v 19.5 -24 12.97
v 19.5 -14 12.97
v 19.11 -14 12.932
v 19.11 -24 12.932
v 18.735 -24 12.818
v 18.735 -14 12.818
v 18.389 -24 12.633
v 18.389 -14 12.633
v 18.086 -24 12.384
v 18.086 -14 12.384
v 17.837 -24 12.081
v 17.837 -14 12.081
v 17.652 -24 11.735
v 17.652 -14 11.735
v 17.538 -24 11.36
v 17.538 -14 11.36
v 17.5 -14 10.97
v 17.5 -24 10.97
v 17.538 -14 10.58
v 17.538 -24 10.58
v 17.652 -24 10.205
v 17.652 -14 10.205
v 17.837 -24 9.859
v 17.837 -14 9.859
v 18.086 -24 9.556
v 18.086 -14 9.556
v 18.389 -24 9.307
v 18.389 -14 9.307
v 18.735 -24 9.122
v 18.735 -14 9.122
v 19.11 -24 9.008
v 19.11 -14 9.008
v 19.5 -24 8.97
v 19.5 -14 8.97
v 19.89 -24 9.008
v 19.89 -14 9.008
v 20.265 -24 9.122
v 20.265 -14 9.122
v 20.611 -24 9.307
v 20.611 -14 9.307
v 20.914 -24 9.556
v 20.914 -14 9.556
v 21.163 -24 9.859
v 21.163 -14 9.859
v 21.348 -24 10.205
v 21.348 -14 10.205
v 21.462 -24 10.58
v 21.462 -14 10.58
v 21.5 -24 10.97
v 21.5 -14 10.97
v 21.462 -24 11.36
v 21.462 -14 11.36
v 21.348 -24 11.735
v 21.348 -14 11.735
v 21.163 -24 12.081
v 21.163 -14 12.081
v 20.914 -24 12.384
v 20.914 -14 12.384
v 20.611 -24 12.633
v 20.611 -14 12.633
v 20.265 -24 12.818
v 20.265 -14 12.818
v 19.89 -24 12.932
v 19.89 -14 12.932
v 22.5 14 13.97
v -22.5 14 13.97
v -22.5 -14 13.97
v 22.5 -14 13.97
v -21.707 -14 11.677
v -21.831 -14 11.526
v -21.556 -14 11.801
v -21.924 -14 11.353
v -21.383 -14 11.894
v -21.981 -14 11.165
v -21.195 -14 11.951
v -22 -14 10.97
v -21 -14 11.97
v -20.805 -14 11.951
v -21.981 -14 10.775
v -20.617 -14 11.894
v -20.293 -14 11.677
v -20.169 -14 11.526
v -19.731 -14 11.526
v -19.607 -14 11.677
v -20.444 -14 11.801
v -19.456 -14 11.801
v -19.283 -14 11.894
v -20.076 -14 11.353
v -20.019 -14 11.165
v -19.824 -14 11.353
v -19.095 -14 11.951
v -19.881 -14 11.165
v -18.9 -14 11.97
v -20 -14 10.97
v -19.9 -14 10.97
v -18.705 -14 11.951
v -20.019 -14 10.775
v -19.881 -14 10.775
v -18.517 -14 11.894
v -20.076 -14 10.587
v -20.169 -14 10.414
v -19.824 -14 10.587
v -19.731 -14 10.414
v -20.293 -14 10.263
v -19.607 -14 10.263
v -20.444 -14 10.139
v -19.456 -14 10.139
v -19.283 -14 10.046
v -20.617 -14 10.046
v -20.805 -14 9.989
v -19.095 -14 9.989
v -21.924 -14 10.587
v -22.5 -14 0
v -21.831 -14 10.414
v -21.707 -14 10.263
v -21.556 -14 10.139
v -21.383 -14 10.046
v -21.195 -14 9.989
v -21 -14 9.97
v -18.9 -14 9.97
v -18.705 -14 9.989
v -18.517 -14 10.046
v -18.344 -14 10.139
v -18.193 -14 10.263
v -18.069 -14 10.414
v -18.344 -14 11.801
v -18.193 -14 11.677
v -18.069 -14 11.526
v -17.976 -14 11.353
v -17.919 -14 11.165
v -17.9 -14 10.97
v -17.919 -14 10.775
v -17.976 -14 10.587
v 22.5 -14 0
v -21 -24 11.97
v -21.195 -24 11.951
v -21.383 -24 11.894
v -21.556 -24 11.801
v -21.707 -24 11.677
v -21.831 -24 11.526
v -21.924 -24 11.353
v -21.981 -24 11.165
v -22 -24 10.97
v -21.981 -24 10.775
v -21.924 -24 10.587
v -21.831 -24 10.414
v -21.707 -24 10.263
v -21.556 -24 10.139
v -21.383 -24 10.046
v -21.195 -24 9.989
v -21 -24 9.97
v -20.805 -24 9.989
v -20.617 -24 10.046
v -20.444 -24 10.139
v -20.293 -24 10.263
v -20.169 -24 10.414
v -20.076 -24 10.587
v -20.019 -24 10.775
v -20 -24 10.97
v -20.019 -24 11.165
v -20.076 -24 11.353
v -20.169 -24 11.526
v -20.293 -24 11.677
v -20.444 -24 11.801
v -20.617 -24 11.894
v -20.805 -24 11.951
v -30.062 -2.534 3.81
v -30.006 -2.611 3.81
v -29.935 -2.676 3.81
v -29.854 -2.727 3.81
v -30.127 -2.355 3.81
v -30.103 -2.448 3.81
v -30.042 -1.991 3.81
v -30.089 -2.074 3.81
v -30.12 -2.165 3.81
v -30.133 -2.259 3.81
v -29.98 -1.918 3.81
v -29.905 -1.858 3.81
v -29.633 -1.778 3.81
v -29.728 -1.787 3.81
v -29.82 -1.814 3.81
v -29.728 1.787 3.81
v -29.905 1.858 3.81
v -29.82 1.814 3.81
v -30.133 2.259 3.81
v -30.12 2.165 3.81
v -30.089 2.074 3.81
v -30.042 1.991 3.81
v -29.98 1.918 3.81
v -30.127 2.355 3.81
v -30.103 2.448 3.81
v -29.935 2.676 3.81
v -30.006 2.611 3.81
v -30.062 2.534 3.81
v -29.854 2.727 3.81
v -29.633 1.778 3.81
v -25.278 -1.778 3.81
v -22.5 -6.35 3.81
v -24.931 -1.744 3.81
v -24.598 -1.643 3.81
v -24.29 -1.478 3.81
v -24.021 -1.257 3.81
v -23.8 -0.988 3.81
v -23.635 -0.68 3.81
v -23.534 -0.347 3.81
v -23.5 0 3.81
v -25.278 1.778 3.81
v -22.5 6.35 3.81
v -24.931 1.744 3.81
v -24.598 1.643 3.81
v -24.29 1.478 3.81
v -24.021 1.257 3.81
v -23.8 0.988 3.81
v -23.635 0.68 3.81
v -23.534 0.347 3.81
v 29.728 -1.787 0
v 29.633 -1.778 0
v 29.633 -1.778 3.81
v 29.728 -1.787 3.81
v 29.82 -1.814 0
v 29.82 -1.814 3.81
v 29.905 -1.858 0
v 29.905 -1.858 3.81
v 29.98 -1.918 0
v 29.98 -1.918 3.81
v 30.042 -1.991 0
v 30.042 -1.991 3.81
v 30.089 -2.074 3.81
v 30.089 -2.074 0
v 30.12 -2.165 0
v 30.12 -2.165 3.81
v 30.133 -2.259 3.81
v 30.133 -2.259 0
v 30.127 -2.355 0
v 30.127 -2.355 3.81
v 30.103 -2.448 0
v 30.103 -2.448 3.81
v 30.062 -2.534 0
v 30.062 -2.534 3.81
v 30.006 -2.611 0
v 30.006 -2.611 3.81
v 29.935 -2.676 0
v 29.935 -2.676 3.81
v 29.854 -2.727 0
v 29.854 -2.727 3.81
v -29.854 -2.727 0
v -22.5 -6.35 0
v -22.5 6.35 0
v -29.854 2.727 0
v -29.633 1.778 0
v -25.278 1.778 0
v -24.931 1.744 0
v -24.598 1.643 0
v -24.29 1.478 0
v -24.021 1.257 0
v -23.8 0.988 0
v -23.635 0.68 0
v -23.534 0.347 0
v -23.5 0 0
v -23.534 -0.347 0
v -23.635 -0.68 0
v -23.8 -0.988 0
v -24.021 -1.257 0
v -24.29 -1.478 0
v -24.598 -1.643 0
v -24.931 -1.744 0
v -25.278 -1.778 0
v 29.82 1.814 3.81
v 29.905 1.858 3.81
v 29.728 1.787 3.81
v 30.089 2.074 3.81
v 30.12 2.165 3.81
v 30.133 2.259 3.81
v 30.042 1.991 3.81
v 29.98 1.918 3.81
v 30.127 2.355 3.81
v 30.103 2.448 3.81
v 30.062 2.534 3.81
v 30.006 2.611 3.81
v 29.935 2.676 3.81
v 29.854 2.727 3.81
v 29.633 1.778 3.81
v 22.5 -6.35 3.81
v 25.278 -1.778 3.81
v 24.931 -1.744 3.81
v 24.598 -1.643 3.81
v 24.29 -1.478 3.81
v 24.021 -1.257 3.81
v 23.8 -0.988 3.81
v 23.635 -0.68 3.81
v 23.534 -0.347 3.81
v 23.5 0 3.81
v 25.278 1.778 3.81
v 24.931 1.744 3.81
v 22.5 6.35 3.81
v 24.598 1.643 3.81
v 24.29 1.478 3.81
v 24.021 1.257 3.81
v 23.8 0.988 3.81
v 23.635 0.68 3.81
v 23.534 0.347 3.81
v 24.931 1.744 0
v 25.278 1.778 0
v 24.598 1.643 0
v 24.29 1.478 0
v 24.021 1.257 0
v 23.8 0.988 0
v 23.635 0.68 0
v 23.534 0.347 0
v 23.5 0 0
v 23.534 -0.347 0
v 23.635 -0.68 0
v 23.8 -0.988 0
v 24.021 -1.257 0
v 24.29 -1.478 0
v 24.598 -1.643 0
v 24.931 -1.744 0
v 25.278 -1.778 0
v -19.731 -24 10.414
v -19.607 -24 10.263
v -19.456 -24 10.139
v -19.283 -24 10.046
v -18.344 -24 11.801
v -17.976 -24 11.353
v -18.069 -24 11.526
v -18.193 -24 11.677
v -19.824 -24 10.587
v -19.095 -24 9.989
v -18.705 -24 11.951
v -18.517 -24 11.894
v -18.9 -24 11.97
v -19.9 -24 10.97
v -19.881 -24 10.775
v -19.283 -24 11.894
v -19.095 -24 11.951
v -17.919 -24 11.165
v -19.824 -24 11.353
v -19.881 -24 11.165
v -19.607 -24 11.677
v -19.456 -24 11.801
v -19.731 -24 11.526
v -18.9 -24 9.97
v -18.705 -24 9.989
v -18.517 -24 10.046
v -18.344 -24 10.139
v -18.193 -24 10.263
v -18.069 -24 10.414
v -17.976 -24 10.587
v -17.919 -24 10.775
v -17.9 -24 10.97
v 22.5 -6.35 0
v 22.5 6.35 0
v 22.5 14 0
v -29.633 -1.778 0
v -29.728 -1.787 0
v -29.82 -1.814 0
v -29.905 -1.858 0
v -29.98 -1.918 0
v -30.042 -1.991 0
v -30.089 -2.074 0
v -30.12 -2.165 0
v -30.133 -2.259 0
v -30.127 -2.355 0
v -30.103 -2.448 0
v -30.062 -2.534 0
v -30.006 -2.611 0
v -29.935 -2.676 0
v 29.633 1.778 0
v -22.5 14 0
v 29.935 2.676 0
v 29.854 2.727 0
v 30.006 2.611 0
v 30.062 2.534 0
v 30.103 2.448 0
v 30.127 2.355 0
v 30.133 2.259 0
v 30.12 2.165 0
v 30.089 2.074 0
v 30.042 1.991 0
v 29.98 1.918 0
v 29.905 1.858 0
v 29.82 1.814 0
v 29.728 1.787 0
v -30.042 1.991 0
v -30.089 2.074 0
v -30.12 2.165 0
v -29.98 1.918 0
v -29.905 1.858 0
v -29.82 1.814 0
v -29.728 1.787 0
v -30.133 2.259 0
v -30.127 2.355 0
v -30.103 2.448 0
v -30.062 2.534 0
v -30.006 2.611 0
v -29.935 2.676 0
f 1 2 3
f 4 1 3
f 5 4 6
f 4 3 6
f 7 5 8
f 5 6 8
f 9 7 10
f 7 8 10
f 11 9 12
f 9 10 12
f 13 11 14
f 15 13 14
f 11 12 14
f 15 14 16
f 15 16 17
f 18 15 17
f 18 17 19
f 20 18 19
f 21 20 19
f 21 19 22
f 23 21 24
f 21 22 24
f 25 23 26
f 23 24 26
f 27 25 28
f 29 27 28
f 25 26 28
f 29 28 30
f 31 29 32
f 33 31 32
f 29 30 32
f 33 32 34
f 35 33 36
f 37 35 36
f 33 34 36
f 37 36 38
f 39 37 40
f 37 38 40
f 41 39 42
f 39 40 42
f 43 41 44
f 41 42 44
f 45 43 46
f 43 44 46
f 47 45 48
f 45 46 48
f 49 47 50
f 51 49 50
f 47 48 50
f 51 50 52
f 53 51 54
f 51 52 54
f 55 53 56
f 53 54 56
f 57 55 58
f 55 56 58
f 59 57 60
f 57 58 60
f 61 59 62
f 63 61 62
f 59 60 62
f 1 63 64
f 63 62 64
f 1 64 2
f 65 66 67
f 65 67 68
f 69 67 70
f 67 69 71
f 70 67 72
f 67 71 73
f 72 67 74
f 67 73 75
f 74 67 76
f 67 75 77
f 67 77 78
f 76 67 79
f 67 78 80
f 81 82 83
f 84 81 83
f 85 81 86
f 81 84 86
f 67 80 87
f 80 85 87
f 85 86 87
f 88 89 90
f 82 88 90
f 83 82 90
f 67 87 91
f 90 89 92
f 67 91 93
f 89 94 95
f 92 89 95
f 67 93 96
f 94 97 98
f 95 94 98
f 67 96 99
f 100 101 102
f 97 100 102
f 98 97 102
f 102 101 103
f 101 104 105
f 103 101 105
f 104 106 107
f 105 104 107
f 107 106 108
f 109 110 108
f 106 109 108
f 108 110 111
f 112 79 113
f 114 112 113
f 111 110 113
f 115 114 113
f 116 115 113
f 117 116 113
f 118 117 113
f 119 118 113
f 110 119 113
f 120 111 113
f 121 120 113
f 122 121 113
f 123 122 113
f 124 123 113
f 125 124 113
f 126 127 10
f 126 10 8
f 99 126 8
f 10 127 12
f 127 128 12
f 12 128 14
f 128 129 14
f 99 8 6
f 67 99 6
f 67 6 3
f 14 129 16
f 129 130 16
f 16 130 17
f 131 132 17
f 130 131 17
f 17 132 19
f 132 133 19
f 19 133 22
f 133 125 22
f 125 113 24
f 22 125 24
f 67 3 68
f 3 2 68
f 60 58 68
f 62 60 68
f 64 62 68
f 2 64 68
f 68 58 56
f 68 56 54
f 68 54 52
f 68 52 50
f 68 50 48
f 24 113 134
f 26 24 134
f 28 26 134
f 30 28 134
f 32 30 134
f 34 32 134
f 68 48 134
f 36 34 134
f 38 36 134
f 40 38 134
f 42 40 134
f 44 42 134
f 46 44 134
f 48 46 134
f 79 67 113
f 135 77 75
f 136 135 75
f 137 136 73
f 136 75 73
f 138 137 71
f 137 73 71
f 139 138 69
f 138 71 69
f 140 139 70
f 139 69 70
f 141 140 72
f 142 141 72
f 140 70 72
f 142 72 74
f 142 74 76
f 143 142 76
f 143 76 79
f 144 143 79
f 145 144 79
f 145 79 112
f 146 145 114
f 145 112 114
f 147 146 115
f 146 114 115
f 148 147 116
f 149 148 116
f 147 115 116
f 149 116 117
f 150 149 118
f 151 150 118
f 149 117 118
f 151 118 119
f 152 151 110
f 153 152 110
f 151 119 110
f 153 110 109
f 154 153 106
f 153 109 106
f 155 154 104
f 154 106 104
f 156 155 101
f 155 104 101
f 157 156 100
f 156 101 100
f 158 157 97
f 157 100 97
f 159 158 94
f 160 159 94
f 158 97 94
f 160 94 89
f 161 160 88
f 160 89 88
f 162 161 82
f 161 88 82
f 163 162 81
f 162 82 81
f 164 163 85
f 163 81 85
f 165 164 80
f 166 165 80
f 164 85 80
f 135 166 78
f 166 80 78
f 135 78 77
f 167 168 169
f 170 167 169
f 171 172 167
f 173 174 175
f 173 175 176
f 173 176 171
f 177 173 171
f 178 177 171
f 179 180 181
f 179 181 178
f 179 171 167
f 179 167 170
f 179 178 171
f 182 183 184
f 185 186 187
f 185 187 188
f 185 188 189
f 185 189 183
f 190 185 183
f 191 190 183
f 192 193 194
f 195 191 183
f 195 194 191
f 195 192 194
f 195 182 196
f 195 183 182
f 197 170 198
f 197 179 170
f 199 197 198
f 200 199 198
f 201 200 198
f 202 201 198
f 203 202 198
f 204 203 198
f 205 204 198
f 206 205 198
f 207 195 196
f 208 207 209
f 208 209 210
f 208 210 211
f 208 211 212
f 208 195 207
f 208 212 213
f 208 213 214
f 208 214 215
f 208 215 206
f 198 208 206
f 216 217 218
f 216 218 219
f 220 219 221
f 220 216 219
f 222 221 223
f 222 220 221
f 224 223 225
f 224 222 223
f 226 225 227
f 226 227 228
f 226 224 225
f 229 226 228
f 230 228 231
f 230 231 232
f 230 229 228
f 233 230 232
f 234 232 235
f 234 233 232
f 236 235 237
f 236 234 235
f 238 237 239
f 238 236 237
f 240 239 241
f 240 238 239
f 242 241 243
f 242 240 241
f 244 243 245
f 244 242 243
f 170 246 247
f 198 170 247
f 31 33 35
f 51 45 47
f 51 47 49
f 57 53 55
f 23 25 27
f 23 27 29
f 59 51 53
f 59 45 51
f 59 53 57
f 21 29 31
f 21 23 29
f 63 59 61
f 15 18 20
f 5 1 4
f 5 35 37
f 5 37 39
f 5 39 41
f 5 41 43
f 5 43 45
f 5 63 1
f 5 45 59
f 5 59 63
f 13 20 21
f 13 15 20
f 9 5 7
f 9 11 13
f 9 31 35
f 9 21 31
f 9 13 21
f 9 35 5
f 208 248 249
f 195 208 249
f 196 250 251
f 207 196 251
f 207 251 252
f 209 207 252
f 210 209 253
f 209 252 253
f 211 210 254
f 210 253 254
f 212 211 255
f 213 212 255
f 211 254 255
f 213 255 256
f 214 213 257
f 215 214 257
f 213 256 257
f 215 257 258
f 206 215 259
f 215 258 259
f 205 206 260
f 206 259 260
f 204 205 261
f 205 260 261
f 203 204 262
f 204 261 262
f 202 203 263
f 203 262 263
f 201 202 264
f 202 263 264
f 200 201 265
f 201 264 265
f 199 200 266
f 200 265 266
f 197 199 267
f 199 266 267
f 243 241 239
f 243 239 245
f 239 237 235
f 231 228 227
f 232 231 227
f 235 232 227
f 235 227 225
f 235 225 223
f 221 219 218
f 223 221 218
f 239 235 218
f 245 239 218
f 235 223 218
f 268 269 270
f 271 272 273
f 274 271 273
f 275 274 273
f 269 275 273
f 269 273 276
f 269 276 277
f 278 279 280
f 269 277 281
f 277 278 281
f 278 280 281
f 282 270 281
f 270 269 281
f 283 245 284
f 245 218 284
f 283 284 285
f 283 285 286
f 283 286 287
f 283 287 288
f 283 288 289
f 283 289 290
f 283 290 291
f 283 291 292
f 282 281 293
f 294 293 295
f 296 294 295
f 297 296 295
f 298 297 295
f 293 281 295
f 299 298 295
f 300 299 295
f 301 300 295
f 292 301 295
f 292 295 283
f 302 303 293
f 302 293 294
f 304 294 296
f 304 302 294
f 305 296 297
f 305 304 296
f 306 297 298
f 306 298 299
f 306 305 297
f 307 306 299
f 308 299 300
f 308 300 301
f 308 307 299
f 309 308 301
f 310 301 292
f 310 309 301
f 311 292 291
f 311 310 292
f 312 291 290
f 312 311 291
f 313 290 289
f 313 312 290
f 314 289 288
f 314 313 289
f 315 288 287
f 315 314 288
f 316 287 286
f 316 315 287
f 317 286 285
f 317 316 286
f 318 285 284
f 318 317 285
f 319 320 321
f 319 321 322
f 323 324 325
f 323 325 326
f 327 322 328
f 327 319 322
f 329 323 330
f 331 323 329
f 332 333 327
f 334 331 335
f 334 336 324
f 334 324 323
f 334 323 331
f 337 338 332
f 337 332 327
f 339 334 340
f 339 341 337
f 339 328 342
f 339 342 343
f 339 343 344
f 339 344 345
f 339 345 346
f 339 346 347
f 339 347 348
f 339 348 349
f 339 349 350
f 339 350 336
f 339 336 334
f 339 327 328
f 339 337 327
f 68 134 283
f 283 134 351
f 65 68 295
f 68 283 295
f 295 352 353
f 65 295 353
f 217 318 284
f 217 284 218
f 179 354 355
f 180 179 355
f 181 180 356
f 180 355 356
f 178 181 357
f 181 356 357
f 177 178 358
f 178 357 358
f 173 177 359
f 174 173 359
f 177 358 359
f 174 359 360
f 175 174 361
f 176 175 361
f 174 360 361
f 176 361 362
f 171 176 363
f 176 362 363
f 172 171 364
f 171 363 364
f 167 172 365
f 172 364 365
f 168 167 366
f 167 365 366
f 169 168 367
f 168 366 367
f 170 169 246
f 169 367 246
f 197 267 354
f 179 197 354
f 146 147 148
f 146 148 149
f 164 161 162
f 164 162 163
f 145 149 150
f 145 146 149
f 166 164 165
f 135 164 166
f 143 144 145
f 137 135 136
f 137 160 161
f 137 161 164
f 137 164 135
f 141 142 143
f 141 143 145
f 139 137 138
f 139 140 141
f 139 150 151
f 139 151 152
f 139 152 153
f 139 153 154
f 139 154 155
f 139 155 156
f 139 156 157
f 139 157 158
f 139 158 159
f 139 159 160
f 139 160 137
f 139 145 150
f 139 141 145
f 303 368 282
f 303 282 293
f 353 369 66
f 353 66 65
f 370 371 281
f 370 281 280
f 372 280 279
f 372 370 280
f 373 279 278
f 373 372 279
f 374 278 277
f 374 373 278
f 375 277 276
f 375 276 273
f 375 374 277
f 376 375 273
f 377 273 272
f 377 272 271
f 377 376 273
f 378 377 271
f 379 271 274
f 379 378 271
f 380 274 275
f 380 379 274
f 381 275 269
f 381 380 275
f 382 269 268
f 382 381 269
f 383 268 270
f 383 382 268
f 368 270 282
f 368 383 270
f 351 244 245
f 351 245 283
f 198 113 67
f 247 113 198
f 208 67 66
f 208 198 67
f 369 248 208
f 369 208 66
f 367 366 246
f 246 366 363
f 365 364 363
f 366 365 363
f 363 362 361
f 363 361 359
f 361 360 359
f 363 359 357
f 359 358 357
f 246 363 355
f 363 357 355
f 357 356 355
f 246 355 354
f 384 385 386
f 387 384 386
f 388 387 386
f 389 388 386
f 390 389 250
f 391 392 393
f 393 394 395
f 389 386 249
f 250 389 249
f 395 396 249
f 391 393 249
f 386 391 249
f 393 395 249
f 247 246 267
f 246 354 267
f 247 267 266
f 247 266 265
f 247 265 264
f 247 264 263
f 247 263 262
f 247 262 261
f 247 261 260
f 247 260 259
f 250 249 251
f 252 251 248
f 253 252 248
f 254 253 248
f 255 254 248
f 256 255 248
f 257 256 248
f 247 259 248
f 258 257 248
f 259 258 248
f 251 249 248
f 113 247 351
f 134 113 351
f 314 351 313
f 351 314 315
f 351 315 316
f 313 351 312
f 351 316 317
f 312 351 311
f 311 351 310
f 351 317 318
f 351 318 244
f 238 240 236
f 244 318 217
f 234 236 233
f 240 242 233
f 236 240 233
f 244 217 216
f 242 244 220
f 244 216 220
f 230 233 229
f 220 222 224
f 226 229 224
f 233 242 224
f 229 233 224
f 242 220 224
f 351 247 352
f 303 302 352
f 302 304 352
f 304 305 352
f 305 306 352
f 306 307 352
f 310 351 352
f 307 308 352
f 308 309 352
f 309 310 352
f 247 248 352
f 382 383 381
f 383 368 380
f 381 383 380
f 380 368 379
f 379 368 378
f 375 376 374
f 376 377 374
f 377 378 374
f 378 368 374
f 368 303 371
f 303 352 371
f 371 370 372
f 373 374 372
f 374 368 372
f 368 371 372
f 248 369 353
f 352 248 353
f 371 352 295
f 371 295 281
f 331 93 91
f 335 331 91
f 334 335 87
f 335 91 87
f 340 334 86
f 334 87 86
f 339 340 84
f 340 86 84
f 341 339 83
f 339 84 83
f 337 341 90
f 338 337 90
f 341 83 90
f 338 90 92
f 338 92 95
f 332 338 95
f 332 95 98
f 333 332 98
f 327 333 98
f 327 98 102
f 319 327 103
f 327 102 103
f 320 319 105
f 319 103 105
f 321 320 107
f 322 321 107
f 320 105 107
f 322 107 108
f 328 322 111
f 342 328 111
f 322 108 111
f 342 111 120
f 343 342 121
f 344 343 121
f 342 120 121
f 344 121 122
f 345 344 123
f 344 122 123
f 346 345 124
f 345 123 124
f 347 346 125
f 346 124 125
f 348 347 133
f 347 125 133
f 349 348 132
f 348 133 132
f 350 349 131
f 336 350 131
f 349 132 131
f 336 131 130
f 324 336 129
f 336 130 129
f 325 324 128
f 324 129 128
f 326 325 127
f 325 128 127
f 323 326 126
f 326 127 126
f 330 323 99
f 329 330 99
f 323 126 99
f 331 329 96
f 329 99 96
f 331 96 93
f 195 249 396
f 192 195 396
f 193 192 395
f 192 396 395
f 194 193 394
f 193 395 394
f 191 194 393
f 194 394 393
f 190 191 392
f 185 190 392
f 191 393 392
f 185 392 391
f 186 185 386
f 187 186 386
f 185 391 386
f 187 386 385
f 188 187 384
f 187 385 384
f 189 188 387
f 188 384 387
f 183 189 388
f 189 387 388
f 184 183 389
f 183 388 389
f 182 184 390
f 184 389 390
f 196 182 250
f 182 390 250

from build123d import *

# Parameters (mm, degrees)
SKETCH1_W           = 45
SKETCH1_H           = 28
BOSS_EXTRUDE1_DEPTH = 13.97
BOSS_EXTRUDE2_DEPTH = 3.81
SKETCH4_R           = 1
SKETCH4_R_2         = 2
BOSS_EXTRUDE3_DEPTH = 10


with BuildPart() as part:
    # Sketch1 → Boss-Extrude1 (new body)
    with BuildSketch(Plane.XY):
        Rectangle(SKETCH1_W, SKETCH1_H)
    extrude(amount=BOSS_EXTRUDE1_DEPTH)

    # Sketch3 → Boss-Extrude2 (add)
    with BuildSketch(Plane(origin=(0, 0, 0), x_dir=(-1, 0, 0), z_dir=(0, 0, -1))):
        with BuildLine():
            Line((-22.5, 6.35), (-29.854033425, 2.72651182))
            ThreePointArc((-29.854033425, 2.72651182), (-30.12, 2.164544965), (-29.633042142, 1.778))
            Line((-29.633042142, 1.778), (-25.278, 1.778))
            ThreePointArc((-25.278, 1.778), (-23.5, 0), (-25.278, -1.778))
            Line((-25.278, -1.778), (-29.633042142, -1.778))
            ThreePointArc((-29.633042142, -1.778), (-30.12, -2.164544965), (-29.854033425, -2.72651182))
            Line((-29.854033425, -2.72651182), (-22.5, -6.35))
            Line((-22.5, -6.35), (-22.5, 6.35))
        make_face()
    boss_extrude2 = extrude(amount=-BOSS_EXTRUDE2_DEPTH)

    # Mirror8: Boss-Extrude2 across plane
    add(boss_extrude2.mirror(Plane(origin=(0, 0, 0), x_dir=(0, 0, 1), z_dir=(1, 0, 0))))

    # Sketch4 → Boss-Extrude3 (add)
    with BuildSketch(Plane.XZ.offset(14)):
        with Locations(Location((-21, 10.97, 0), (0, 0, 90))):
            Circle(SKETCH4_R)
        with Locations(Location((-18.9, 10.97, 0), (0, 0, 90))):
            Circle(SKETCH4_R)
        with Locations(Location((19.5, 10.97, 0), (0, 0, 90))):
            Circle(SKETCH4_R_2)
    extrude(amount=BOSS_EXTRUDE3_DEPTH)


solid = part.part
